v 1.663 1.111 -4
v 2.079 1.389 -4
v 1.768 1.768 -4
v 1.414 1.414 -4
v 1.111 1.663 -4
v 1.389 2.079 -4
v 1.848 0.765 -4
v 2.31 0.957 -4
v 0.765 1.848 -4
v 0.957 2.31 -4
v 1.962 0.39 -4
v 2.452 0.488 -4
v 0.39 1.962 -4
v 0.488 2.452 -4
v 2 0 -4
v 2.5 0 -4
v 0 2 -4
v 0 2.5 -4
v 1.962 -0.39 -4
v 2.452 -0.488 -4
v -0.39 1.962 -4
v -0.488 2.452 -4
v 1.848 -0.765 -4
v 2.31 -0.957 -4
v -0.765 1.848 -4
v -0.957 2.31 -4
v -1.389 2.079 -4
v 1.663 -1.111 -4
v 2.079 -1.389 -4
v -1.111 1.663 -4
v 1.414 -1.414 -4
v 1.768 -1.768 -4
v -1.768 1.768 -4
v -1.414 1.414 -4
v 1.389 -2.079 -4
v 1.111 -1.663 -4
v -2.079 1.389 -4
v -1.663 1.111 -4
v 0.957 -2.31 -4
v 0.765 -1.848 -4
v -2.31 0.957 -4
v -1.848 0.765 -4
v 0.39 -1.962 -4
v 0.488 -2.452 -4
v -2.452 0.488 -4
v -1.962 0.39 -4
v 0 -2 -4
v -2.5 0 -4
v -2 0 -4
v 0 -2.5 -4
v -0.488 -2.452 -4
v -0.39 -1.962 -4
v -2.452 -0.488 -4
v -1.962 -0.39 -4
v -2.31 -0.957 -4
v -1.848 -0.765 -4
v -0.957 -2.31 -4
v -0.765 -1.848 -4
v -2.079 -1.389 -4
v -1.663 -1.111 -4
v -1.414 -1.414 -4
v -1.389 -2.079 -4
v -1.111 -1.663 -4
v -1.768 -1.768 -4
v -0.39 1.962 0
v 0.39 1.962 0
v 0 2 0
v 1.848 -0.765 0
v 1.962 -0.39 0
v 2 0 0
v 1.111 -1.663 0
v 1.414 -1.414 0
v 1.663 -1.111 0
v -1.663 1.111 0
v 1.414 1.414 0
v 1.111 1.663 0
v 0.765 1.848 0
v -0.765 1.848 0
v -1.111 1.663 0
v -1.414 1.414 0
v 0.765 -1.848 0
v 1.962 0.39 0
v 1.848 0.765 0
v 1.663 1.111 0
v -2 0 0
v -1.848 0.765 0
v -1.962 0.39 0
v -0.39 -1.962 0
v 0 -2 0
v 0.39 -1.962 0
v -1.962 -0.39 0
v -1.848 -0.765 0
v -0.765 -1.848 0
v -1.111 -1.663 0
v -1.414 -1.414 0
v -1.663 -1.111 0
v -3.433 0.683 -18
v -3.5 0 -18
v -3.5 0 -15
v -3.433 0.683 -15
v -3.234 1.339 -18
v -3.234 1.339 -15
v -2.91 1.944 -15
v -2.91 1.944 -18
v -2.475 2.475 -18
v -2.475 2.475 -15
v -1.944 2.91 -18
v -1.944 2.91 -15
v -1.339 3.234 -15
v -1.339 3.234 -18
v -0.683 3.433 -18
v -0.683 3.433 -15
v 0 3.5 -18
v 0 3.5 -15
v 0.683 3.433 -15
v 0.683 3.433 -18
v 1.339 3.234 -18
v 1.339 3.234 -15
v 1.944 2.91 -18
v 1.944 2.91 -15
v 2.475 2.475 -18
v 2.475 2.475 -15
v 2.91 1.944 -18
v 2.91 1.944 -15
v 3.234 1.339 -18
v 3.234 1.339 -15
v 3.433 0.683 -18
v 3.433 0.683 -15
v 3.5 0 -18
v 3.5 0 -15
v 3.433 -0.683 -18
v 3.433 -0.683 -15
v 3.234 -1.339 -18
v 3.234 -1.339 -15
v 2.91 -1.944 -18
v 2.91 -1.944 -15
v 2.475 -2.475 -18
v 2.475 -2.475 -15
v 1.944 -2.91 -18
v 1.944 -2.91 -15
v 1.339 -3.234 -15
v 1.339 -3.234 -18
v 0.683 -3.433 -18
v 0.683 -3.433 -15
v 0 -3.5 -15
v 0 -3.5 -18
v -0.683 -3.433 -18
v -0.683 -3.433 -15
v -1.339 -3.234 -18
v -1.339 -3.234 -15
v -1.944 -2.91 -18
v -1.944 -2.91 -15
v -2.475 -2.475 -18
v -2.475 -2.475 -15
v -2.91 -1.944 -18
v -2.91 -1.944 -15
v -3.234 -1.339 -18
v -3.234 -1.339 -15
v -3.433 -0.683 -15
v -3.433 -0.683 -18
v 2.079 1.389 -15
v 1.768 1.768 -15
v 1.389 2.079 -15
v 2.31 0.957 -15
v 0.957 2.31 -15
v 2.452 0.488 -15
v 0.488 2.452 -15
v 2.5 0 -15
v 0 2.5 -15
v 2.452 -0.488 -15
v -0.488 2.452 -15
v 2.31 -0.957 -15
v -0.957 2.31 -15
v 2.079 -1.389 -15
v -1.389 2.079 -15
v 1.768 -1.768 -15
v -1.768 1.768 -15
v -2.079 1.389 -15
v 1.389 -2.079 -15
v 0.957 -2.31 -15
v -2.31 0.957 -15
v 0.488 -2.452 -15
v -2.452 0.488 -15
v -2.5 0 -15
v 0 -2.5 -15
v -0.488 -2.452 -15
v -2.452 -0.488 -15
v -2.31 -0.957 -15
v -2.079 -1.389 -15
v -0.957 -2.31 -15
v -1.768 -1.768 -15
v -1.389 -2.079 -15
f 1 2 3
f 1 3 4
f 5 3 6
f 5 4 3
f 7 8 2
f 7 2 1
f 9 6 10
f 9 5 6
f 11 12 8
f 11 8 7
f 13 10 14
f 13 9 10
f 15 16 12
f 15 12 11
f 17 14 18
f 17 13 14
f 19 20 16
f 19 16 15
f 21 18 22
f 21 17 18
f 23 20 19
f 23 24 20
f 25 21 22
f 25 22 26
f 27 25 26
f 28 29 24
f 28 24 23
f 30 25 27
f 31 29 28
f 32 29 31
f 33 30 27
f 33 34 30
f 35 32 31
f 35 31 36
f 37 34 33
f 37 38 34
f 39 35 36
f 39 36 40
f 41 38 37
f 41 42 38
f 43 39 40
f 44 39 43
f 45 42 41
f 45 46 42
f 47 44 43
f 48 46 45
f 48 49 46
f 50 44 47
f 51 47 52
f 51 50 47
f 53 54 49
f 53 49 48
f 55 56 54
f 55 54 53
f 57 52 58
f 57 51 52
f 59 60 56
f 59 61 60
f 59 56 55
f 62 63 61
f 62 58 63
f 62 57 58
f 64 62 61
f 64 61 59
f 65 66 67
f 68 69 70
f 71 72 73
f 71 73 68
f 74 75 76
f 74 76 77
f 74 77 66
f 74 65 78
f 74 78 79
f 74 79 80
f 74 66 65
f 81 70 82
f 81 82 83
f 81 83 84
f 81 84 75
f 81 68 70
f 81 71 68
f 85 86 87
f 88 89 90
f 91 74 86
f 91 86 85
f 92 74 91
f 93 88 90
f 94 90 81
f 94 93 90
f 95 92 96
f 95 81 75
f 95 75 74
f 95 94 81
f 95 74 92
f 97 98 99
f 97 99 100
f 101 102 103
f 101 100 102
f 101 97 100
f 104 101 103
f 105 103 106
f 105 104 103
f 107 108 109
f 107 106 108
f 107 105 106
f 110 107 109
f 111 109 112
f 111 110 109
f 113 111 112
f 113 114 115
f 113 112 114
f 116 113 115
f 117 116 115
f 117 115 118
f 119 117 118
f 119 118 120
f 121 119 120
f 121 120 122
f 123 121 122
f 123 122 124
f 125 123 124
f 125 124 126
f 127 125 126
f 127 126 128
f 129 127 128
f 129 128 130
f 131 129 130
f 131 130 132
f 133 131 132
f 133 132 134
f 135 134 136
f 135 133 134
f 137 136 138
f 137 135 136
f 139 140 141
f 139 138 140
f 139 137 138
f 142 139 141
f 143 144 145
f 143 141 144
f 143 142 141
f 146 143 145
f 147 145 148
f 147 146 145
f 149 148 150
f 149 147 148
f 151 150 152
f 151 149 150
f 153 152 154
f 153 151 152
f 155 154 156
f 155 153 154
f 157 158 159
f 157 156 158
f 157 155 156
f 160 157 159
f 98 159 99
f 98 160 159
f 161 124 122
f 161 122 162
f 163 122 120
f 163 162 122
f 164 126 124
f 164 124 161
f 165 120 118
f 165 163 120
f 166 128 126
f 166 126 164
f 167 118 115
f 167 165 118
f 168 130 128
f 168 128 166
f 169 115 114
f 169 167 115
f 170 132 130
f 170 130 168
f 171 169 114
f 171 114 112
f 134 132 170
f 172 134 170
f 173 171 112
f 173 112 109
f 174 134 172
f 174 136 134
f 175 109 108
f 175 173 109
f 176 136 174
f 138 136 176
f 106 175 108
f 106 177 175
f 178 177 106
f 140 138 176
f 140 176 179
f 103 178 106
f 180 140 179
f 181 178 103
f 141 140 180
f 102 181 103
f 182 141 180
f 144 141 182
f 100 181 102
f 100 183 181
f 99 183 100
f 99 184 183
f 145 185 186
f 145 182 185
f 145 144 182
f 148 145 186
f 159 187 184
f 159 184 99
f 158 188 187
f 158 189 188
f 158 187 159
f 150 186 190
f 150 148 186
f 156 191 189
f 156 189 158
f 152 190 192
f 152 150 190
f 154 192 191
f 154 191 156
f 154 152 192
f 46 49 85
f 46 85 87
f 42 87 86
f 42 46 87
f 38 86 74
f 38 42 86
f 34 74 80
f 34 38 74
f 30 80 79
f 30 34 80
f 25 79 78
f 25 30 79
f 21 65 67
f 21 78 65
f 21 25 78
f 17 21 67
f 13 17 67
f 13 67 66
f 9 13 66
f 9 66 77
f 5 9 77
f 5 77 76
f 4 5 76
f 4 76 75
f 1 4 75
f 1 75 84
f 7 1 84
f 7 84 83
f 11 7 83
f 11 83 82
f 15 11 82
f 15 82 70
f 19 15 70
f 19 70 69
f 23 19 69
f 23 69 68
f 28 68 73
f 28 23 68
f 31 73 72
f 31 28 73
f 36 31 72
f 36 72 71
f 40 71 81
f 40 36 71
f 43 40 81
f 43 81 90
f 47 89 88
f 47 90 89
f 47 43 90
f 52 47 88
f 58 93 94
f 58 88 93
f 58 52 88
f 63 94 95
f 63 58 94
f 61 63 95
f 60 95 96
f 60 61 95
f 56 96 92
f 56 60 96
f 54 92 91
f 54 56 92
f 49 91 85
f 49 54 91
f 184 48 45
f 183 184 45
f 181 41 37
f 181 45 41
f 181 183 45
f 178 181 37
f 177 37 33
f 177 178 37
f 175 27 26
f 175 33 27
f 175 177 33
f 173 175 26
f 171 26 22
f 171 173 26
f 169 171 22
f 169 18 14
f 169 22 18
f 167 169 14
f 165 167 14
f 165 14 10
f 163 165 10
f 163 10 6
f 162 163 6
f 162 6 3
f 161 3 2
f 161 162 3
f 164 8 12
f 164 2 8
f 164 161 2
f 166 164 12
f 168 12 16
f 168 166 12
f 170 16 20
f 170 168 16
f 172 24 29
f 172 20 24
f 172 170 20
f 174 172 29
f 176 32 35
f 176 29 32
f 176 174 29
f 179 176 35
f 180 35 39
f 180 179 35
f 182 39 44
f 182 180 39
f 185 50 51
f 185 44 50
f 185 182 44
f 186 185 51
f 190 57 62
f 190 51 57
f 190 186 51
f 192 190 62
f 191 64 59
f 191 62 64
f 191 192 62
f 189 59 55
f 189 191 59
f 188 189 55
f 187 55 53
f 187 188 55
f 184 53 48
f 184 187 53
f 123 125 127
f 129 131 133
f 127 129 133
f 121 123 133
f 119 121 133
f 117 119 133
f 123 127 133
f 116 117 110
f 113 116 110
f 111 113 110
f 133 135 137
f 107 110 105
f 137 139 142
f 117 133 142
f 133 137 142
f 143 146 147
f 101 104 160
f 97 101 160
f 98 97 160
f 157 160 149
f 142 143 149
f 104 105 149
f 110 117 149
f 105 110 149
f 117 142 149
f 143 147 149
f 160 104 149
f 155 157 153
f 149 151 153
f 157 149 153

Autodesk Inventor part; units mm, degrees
ref_plane "YZ Plane" through (0, 0, 0) normal (1, 0, 0) x (0, 1, 0)
ref_plane "XZ Plane" through (0, 0, 0) normal (0, 1, 0) x (-1, 0, 0)
ref_plane "XY Plane" through (0, 0, 0) normal (0, 0, 1) x (1, 0, 0)
sketch "Sketch1" plane through (0, 0, 0) normal (0, 1, 0) x (-1, 0, 0)
  line L0 (0, 0) -> (2, 0)
  line L1 (2, 0) -> (2, -4)
  line L2 (2, -4) -> (2.5, -4)
  line L3 (2.5, -4) -> (2.5, -15)
  line L4 (2.5, -15) -> (3.5, -15)
  line L5 (3.5, -15) -> (3.5, -18)
  line L6 (3.5, -18) -> (0, -18)
  line L7 (0, -18) -> (0, 0)
  dimension "d0" = 3
  dimension "d1" = 11
  dimension "d2" = 4
  dimension "d3" = 7
  dimension "d4" = 5
  dimension "d5" = 4
revolve "Revolution1" add sketch "Sketch1" angle 360 about axis through (0, 0, -18) along (0, 0, 1)
thread "Thread1" size "M4x0.7" class "6g" standard "ISO Metric profile" length 12
properties part number "2053"
